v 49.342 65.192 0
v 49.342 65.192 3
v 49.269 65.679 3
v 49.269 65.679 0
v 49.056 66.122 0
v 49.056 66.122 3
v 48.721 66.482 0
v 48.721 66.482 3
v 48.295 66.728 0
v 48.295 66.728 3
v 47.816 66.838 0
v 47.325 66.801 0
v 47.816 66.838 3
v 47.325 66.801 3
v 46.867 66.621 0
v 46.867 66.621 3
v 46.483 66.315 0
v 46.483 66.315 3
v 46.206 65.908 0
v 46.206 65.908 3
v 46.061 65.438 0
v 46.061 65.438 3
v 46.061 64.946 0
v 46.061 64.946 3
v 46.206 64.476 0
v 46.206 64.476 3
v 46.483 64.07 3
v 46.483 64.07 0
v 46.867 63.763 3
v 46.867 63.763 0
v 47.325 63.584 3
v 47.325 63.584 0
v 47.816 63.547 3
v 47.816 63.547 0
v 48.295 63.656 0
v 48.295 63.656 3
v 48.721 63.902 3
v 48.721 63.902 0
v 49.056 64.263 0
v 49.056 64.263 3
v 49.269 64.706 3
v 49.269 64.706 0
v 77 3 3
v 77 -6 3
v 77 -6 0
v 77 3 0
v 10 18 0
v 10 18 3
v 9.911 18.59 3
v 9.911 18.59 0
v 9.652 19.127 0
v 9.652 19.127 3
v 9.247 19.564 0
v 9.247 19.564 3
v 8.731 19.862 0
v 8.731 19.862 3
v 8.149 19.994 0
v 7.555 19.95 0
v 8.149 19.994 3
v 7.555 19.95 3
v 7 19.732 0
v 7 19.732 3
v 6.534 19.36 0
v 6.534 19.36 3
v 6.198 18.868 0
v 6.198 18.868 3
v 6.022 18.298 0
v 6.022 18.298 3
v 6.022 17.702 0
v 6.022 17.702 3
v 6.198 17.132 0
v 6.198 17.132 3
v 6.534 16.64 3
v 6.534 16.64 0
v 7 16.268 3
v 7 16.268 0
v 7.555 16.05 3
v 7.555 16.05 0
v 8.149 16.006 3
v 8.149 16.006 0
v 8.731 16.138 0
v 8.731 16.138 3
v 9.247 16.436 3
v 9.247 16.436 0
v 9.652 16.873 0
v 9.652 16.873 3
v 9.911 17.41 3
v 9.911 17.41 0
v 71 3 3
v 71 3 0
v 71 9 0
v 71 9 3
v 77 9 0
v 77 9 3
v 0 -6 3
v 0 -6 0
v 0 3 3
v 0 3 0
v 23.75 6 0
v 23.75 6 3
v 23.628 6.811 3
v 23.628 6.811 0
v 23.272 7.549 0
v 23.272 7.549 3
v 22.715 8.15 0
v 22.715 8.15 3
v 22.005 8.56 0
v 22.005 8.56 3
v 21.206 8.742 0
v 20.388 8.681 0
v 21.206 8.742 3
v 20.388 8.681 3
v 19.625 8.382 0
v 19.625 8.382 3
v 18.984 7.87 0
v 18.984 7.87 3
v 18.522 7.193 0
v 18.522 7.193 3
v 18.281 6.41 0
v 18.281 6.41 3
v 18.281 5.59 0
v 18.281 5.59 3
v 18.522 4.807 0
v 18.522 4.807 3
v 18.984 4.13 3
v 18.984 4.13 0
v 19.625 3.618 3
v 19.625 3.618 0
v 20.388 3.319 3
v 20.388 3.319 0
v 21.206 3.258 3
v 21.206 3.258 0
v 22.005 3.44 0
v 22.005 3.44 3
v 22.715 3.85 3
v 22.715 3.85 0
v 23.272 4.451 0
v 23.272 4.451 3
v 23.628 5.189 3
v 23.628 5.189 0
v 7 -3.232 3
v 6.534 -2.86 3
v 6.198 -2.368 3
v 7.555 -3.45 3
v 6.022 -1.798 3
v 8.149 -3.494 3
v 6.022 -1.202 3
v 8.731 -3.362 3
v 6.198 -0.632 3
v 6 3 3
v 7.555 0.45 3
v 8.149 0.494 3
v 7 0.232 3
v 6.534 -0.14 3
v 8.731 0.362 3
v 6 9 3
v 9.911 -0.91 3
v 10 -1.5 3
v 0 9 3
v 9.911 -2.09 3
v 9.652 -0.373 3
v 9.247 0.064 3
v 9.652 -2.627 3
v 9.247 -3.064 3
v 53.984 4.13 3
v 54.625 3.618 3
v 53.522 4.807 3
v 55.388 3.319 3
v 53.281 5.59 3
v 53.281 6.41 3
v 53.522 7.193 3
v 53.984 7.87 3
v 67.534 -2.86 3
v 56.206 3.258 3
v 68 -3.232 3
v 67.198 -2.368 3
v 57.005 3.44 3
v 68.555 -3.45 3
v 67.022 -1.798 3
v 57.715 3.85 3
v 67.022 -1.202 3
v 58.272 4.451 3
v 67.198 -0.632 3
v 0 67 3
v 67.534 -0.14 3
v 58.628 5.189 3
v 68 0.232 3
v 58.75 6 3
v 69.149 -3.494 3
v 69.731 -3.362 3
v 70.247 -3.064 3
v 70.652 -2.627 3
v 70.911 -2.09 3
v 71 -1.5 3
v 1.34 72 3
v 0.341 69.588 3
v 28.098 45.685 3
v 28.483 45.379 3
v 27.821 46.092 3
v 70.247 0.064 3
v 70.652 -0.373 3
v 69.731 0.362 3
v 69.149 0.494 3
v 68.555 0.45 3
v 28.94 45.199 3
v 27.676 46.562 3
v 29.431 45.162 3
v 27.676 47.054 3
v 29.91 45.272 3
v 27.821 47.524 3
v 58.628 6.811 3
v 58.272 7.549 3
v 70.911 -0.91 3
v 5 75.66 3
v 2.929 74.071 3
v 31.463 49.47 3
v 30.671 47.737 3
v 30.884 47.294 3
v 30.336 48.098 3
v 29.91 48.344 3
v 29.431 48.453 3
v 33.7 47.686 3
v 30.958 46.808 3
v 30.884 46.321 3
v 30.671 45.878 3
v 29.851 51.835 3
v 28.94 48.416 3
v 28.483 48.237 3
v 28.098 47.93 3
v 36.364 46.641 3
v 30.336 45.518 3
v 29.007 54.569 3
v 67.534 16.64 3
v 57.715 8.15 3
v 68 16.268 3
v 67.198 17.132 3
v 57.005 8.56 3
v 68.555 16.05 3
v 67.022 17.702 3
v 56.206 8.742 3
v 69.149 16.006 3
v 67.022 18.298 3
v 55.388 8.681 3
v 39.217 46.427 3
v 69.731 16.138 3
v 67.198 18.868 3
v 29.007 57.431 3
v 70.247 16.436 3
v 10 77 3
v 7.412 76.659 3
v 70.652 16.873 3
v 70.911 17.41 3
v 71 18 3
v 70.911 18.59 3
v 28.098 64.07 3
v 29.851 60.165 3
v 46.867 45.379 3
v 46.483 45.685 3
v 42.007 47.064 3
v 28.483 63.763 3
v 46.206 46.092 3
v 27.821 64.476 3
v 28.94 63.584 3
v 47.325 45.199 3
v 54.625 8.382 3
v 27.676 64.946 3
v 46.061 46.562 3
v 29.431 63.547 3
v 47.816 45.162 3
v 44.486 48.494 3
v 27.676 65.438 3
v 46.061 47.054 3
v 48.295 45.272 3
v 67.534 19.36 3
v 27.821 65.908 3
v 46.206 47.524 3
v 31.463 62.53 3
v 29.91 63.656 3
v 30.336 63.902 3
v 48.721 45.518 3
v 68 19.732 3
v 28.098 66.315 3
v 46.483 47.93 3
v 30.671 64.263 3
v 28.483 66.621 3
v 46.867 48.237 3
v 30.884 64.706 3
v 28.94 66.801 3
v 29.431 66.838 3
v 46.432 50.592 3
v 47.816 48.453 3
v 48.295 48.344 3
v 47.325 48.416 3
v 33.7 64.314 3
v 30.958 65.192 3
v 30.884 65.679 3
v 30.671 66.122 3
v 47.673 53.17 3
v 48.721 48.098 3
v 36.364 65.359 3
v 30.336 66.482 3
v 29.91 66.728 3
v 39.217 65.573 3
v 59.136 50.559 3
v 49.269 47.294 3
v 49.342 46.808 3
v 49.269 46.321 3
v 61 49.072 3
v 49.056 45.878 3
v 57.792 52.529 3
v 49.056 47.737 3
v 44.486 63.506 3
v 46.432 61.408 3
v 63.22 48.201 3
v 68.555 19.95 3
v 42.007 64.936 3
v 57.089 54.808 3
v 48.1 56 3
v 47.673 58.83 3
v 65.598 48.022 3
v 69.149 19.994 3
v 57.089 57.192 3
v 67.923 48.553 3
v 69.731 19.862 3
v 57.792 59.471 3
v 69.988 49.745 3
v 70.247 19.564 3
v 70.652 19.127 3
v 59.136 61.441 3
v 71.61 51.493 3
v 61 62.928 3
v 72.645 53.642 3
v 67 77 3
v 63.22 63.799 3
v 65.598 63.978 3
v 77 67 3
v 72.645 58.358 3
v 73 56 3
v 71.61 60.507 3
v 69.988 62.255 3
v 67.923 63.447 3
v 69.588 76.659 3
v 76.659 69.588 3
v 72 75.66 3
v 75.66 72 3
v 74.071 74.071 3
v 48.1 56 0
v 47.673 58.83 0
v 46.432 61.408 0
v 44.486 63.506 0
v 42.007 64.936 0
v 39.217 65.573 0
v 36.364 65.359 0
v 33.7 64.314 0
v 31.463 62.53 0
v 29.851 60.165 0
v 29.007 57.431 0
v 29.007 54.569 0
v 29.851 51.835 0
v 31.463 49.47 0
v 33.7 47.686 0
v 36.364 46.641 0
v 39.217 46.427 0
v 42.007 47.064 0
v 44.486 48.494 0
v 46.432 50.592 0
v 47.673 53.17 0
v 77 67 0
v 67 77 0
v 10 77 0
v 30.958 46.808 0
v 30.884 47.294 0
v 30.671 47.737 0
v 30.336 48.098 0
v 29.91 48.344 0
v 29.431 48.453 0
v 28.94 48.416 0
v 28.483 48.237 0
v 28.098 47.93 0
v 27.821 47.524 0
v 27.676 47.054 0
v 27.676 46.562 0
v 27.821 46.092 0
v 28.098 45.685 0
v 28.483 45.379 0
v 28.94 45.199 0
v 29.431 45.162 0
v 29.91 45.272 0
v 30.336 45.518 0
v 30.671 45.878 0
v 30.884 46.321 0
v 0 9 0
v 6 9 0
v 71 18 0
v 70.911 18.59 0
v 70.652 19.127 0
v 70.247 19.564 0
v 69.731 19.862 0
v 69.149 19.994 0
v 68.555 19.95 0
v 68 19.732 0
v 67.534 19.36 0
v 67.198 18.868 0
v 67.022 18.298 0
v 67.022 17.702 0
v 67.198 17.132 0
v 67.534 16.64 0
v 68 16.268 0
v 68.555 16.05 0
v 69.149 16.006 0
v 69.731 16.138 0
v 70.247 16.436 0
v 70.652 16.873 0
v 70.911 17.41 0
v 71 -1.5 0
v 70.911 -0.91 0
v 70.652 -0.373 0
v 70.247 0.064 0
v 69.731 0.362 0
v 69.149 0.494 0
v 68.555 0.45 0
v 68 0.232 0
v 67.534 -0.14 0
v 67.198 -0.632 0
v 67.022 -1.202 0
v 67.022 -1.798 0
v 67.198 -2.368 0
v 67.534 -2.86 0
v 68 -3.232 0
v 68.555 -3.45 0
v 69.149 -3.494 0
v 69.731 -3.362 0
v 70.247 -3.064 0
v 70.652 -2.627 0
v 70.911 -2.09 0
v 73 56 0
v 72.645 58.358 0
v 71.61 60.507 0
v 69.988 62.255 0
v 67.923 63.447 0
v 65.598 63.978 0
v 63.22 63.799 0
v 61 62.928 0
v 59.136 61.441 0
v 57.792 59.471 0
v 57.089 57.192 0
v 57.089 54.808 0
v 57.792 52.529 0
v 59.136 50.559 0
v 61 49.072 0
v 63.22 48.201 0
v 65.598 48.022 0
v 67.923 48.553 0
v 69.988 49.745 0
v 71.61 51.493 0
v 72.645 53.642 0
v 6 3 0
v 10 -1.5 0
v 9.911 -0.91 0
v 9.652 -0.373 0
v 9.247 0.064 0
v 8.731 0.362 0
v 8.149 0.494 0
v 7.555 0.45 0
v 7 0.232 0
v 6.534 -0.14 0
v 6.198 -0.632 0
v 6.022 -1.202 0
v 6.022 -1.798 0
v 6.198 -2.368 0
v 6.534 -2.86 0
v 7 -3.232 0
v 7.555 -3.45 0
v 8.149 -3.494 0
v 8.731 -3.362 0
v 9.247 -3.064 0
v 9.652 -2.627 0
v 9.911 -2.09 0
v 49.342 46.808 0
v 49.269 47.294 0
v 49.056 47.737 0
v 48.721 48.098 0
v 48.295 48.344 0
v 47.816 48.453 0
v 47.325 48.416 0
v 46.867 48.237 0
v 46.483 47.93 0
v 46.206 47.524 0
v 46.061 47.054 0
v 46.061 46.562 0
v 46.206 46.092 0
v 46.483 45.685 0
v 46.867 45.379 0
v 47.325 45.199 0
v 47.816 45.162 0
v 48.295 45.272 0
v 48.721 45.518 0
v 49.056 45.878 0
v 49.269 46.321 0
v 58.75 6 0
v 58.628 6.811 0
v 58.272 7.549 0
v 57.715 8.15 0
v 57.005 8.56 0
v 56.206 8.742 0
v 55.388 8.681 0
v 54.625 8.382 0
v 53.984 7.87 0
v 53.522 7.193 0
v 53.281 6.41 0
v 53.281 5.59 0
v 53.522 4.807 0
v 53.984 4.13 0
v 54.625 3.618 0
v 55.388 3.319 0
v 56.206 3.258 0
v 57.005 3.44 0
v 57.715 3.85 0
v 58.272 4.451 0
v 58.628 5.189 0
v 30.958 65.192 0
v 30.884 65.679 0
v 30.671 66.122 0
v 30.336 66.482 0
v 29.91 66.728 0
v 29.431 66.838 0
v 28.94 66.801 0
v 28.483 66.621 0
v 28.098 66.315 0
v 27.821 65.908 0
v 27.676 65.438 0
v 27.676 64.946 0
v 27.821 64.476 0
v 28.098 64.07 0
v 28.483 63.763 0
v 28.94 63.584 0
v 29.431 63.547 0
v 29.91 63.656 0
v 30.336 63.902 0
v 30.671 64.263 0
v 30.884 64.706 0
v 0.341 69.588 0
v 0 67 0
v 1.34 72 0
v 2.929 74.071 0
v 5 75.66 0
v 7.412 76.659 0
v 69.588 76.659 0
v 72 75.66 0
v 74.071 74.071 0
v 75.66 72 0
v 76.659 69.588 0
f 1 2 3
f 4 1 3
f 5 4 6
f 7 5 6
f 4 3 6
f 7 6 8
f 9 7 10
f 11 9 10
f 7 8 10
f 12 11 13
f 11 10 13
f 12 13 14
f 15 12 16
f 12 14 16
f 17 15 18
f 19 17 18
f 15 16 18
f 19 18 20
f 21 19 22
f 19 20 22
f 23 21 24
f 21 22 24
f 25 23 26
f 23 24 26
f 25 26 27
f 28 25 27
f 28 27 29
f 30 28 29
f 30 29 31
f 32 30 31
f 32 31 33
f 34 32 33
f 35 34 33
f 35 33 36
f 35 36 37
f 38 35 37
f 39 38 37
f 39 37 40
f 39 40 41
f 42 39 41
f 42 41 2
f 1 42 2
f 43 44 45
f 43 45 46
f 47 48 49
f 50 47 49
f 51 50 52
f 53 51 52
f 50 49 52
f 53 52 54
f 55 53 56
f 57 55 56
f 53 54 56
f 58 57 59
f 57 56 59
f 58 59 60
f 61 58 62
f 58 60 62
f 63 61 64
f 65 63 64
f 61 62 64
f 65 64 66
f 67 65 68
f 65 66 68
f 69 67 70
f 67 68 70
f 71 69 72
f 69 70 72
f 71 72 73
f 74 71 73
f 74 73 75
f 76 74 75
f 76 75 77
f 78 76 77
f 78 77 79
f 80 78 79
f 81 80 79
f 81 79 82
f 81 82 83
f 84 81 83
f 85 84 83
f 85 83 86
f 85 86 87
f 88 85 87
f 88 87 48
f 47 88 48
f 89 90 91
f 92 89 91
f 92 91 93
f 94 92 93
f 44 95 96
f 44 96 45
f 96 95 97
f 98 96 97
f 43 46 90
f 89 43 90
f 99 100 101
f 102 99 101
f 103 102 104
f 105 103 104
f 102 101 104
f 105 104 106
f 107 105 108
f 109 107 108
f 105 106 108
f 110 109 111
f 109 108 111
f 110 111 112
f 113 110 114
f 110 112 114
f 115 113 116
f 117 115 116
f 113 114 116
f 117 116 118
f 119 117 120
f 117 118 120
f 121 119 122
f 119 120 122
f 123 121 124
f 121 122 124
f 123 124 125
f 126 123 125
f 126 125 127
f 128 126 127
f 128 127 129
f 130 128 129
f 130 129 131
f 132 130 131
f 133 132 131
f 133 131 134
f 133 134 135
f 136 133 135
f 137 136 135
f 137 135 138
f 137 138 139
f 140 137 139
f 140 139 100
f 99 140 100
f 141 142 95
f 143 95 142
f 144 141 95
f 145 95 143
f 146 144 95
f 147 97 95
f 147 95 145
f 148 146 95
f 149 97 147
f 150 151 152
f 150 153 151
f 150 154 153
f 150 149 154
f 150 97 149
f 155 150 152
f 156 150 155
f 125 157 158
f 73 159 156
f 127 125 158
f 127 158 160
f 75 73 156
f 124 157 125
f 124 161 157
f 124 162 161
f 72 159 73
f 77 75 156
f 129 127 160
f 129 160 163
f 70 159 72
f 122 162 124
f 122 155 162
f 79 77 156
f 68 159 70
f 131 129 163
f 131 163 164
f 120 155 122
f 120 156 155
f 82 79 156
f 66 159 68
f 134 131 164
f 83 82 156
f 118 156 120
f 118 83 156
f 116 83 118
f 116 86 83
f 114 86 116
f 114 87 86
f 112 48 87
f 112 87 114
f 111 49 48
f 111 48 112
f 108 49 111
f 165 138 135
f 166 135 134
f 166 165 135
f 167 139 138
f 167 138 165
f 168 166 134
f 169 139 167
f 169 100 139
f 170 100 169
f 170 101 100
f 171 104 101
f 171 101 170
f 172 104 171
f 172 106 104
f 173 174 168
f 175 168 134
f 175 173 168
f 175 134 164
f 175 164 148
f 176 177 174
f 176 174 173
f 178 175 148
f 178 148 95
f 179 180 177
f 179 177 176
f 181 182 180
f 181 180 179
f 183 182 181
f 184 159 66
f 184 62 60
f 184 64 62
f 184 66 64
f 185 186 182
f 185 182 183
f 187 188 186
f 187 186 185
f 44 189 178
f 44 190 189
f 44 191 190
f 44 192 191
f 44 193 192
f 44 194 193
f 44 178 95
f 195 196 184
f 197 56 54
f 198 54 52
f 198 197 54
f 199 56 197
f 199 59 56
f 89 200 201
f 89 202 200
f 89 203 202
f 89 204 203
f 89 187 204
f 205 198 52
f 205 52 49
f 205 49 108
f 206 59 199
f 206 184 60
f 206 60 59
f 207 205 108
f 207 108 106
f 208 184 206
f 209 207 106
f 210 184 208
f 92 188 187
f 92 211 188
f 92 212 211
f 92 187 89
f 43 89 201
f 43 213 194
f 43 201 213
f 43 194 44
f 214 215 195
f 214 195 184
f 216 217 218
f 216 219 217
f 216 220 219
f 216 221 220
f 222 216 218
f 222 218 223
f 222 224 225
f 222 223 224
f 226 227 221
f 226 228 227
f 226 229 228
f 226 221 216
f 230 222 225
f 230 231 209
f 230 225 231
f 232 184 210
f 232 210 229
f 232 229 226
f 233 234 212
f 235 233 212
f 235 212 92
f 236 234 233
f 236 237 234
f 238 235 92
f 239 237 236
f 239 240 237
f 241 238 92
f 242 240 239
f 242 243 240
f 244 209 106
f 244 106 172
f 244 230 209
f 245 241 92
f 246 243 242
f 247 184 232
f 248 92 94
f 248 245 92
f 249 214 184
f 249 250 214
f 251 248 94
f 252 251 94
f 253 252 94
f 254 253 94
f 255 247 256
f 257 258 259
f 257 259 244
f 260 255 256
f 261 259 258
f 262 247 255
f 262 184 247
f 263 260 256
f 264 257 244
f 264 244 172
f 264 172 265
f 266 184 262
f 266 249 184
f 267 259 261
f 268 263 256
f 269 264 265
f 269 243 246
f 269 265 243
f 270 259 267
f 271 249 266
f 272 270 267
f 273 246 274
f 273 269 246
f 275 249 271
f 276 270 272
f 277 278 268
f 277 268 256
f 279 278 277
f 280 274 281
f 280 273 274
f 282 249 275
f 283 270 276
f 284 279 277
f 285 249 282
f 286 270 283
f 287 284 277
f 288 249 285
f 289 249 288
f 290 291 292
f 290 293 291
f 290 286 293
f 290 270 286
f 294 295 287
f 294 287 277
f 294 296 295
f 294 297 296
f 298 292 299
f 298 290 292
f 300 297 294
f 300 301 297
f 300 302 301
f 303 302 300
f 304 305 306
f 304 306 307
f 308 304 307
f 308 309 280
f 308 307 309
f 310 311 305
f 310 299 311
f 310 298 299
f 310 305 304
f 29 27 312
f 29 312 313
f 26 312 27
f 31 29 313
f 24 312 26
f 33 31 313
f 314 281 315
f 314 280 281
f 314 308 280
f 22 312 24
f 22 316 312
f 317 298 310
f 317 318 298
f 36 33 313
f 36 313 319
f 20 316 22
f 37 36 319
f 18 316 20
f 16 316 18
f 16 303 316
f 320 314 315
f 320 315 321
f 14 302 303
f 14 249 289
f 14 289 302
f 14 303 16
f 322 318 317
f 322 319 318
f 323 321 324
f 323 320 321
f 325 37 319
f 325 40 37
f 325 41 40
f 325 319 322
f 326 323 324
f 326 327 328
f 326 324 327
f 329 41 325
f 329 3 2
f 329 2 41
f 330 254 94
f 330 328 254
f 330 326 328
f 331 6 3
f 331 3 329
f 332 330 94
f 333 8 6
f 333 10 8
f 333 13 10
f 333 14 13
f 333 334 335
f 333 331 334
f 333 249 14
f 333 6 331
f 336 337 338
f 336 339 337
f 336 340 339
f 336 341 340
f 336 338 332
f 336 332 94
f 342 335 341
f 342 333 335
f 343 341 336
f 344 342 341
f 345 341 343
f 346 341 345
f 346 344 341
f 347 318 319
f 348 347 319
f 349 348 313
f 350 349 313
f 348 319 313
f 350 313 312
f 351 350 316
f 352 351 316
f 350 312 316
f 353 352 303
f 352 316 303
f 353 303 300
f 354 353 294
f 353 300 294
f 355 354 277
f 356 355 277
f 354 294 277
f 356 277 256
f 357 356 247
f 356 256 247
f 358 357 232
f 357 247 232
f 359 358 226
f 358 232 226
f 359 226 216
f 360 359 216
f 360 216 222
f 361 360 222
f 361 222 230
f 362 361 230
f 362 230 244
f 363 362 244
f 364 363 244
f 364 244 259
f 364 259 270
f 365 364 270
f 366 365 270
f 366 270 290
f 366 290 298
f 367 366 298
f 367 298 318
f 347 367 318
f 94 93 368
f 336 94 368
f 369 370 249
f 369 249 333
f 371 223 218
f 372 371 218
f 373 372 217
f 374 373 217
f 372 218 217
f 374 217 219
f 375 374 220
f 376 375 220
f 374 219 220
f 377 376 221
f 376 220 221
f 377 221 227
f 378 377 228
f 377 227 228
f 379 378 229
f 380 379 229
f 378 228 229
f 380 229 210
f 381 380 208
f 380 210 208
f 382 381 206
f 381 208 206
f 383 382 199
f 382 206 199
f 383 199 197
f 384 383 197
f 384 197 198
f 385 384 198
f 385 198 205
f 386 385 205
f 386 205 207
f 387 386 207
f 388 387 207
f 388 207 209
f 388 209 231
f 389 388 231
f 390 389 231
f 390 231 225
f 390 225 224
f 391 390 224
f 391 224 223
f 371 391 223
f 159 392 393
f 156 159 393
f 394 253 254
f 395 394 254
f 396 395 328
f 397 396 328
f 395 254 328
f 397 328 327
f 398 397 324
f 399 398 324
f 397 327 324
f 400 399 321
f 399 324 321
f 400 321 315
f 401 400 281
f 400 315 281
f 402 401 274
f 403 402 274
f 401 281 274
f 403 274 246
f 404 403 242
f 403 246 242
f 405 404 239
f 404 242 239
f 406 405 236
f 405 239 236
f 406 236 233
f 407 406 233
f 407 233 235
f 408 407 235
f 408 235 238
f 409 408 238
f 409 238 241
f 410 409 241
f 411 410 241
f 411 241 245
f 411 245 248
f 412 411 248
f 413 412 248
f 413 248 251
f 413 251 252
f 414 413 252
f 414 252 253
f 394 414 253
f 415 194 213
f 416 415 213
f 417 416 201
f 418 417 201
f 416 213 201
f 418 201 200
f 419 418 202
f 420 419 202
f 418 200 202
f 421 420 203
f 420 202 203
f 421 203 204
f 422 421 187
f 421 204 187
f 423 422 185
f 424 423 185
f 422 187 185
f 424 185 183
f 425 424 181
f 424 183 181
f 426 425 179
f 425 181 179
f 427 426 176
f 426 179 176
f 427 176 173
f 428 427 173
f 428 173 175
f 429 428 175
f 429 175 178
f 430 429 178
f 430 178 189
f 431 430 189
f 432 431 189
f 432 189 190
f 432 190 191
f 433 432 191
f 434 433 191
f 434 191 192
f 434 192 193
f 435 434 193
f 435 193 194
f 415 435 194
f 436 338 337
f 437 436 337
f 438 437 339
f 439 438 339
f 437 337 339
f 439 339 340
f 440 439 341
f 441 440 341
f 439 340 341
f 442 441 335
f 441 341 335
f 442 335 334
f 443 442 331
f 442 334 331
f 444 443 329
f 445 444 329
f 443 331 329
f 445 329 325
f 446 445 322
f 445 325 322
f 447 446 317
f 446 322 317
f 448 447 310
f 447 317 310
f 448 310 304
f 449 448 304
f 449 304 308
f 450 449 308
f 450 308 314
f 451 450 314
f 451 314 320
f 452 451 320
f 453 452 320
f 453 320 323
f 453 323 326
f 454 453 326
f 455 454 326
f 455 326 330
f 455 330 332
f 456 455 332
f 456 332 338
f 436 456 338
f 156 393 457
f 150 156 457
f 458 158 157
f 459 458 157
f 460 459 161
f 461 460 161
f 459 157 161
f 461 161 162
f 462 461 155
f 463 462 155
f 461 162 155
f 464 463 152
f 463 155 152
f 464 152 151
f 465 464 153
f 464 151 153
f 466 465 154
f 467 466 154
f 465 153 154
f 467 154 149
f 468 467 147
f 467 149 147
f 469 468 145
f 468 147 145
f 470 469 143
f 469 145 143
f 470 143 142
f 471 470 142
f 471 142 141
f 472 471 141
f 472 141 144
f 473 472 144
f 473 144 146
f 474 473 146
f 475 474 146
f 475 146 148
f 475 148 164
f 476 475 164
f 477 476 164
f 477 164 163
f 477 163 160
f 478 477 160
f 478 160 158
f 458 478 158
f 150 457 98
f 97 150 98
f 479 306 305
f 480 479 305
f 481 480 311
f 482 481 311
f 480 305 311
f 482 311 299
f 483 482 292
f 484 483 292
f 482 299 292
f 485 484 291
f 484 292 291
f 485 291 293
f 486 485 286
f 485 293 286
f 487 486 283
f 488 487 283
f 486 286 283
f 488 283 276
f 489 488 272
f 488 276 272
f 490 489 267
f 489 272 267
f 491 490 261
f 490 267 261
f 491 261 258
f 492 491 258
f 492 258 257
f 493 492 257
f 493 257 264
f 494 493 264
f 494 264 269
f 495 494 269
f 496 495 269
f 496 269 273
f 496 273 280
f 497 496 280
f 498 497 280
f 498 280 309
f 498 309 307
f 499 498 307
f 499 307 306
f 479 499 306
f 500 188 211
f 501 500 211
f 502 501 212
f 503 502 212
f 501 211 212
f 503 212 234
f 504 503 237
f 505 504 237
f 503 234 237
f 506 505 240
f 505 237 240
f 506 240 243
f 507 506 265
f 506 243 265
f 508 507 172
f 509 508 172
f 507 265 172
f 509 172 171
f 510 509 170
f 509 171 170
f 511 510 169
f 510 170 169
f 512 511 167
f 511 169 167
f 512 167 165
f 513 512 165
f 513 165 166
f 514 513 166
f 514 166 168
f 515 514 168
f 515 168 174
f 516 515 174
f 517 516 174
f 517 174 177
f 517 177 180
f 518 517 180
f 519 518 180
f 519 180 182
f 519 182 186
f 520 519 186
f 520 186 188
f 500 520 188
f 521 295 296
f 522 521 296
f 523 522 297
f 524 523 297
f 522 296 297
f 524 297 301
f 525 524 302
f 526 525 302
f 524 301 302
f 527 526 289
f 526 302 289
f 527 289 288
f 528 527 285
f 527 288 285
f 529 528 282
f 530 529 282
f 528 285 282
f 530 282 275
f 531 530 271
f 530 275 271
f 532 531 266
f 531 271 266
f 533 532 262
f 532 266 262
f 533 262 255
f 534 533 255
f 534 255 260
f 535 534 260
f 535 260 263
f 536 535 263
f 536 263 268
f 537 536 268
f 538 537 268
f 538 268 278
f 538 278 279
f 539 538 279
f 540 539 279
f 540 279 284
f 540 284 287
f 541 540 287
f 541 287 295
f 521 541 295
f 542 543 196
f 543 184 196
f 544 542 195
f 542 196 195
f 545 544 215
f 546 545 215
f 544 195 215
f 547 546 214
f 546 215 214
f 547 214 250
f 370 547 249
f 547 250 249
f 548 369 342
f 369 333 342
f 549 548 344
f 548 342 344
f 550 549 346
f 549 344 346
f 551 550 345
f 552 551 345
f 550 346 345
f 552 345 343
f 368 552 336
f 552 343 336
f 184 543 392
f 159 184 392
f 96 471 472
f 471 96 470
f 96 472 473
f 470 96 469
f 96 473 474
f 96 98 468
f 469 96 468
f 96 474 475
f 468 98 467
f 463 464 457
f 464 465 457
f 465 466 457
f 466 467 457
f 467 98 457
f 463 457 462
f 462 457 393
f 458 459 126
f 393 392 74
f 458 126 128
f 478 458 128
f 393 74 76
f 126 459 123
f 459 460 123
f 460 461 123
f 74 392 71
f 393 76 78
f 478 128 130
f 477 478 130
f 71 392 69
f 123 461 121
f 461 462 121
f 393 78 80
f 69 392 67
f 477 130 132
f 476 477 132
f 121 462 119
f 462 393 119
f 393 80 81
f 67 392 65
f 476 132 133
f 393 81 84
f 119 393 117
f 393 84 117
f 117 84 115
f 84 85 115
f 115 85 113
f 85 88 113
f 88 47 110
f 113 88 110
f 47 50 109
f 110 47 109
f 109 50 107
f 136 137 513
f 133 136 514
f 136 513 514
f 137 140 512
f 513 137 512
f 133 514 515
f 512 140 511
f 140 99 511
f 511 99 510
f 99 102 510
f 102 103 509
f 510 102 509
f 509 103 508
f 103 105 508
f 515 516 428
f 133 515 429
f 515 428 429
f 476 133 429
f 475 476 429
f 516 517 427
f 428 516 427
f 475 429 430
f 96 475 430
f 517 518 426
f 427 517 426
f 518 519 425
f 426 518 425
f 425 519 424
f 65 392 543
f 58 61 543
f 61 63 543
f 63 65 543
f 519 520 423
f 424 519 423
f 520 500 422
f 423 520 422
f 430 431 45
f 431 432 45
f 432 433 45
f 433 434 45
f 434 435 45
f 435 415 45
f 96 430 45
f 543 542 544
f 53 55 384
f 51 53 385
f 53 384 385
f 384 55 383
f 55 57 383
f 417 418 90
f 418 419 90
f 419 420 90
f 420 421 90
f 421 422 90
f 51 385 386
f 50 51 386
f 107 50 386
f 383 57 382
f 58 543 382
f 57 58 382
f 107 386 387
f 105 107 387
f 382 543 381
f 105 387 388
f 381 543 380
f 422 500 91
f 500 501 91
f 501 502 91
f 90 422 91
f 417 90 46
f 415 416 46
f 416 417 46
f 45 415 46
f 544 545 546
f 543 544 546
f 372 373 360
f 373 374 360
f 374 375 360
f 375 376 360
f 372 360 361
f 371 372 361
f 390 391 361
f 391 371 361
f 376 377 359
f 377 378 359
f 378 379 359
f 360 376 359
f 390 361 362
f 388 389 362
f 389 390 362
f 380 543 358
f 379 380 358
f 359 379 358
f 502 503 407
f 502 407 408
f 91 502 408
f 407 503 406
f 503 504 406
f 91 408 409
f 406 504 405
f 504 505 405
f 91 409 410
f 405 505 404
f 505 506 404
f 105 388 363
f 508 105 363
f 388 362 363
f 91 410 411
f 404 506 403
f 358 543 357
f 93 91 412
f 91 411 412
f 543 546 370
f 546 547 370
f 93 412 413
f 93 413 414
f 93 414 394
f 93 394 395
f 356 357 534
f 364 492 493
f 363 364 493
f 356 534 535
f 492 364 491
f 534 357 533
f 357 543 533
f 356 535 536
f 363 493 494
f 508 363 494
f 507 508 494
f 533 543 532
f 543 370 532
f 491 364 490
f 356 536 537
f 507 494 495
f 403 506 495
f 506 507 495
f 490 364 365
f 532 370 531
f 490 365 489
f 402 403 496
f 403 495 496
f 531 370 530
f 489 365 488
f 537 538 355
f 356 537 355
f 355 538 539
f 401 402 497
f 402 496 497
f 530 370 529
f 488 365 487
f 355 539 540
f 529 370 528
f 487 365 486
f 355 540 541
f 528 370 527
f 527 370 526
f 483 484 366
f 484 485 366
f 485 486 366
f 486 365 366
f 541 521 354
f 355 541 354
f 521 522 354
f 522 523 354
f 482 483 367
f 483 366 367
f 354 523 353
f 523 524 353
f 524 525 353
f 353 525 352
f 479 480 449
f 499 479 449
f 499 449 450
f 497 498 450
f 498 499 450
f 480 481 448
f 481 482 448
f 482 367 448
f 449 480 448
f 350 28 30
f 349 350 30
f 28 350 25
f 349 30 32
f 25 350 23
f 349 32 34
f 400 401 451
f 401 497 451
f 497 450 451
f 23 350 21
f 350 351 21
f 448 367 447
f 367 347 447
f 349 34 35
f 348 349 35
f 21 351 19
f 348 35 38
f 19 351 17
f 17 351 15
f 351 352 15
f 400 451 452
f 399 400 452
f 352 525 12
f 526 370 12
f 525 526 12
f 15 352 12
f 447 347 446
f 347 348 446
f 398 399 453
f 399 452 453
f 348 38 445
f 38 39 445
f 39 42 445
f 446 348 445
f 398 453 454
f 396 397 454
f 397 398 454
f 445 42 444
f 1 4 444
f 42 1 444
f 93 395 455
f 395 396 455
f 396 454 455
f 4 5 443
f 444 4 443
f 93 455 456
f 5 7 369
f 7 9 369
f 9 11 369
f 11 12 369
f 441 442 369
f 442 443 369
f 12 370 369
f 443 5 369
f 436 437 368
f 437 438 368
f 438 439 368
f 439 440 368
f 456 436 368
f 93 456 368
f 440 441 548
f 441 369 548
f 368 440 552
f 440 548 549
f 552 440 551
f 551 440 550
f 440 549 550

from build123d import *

# Parameters (mm, degrees)
SKETCH1_W           = 77
SKETCH1_H           = 65
BOSS_EXTRUDE1_DEPTH = 3
SKETCH2_R           = 2.75
CUT_EXTRUDE1_DEPTH  = 109.935760887
SKETCH3_R           = 1.65
SKETCH3_R_2         = 9.6
CUT_EXTRUDE2_DEPTH  = 109.935760887
FILLET1_R           = 10
SKETCH4_W           = 77
SKETCH4_H           = 6
BOSS_EXTRUDE2_DEPTH = 3
SKETCH5_R           = 2
CUT_EXTRUDE3_DEPTH  = 109.935760887
SKETCH6_R           = 8
SKETCH6_R_2         = 2.5
CUT_EXTRUDE4_DEPTH  = 109.935760887


with BuildPart() as part:
    # Sketch1 → Boss-Extrude1 (new body)
    with BuildSketch(Plane.XY):
        with Locations((38.5, 44.5)):
            Rectangle(SKETCH1_W, SKETCH1_H)
        Polygon((77, 12), (38.5, 12), (38.5, 0), (77, 0), (77, 3), (71, 3), (71, 9), (77, 9), align=None)
        Polygon((38.5, 0), (38.5, 12), (0, 12), (0, 9), (6, 9), (6, 3), (0, 3), (0, 0), align=None)
    extrude(amount=BOSS_EXTRUDE1_DEPTH)

    # Sketch2 → Cut-Extrude1 (cut, through all)
    with BuildSketch(Plane.XY.offset(3)):
        with Locations((21, 6)):
            Circle(SKETCH2_R)
        with Locations((56, 6)):
            Circle(SKETCH2_R)
    extrude(amount=-CUT_EXTRUDE1_DEPTH, mode=Mode.SUBTRACT)

    # Sketch3 → Cut-Extrude2 (cut, through all)
    with BuildSketch(Plane.XY.offset(3)):
        with Locations((29.307611845, 46.807611845)):
            Circle(SKETCH3_R)
        with Locations((47.692388155, 46.807611845)):
            Circle(SKETCH3_R)
        with Locations((47.692388155, 65.192388155)):
            Circle(SKETCH3_R)
        with Locations((29.307611845, 65.192388155)):
            Circle(SKETCH3_R)
        with Locations((38.5, 56)):
            Circle(SKETCH3_R_2)
    extrude(amount=-CUT_EXTRUDE2_DEPTH, mode=Mode.SUBTRACT)

    # Fillet1
    fillet1_edges = [part.edges().sort_by_distance(p)[0] for p in [
        (0, 77, 1.5),
        (77, 77, 1.5),
    ]]
    fillet(fillet1_edges, radius=FILLET1_R)

    # Sketch4 → Boss-Extrude2 (add)
    with BuildSketch(Plane.XY.offset(3)):
        with Locations((38.5, -3)):
            Rectangle(SKETCH4_W, SKETCH4_H)
    extrude(amount=-BOSS_EXTRUDE2_DEPTH)

    # Sketch5 → Cut-Extrude3 (cut, through all)
    with BuildSketch(Plane.XY.offset(3)):
        with Locations((8, -1.5)):
            Circle(SKETCH5_R)
        with Locations((69, -1.5)):
            Circle(SKETCH5_R)
        with Locations((8, 18)):
            Circle(SKETCH5_R)
        with Locations((69, 18)):
            Circle(SKETCH5_R)
    extrude(amount=-CUT_EXTRUDE3_DEPTH, mode=Mode.SUBTRACT)

    # Sketch6 → Cut-Extrude4 (cut, through all)
    # profile 1 of 2: a face of its own
    with BuildSketch(Plane.XY.offset(3)):
        with Locations((65, 56)):
            Circle(SKETCH6_R)
        with Locations((65, 56)):
            Circle(SKETCH6_R_2, mode=Mode.SUBTRACT)
    # profile 2 of 2: a face of its own
    with BuildSketch(Plane.XY.offset(3)):
        with Locations((65, 56)):
            Circle(SKETCH6_R_2)
    extrude(amount=-CUT_EXTRUDE4_DEPTH, mode=Mode.SUBTRACT)


solid = part.part
